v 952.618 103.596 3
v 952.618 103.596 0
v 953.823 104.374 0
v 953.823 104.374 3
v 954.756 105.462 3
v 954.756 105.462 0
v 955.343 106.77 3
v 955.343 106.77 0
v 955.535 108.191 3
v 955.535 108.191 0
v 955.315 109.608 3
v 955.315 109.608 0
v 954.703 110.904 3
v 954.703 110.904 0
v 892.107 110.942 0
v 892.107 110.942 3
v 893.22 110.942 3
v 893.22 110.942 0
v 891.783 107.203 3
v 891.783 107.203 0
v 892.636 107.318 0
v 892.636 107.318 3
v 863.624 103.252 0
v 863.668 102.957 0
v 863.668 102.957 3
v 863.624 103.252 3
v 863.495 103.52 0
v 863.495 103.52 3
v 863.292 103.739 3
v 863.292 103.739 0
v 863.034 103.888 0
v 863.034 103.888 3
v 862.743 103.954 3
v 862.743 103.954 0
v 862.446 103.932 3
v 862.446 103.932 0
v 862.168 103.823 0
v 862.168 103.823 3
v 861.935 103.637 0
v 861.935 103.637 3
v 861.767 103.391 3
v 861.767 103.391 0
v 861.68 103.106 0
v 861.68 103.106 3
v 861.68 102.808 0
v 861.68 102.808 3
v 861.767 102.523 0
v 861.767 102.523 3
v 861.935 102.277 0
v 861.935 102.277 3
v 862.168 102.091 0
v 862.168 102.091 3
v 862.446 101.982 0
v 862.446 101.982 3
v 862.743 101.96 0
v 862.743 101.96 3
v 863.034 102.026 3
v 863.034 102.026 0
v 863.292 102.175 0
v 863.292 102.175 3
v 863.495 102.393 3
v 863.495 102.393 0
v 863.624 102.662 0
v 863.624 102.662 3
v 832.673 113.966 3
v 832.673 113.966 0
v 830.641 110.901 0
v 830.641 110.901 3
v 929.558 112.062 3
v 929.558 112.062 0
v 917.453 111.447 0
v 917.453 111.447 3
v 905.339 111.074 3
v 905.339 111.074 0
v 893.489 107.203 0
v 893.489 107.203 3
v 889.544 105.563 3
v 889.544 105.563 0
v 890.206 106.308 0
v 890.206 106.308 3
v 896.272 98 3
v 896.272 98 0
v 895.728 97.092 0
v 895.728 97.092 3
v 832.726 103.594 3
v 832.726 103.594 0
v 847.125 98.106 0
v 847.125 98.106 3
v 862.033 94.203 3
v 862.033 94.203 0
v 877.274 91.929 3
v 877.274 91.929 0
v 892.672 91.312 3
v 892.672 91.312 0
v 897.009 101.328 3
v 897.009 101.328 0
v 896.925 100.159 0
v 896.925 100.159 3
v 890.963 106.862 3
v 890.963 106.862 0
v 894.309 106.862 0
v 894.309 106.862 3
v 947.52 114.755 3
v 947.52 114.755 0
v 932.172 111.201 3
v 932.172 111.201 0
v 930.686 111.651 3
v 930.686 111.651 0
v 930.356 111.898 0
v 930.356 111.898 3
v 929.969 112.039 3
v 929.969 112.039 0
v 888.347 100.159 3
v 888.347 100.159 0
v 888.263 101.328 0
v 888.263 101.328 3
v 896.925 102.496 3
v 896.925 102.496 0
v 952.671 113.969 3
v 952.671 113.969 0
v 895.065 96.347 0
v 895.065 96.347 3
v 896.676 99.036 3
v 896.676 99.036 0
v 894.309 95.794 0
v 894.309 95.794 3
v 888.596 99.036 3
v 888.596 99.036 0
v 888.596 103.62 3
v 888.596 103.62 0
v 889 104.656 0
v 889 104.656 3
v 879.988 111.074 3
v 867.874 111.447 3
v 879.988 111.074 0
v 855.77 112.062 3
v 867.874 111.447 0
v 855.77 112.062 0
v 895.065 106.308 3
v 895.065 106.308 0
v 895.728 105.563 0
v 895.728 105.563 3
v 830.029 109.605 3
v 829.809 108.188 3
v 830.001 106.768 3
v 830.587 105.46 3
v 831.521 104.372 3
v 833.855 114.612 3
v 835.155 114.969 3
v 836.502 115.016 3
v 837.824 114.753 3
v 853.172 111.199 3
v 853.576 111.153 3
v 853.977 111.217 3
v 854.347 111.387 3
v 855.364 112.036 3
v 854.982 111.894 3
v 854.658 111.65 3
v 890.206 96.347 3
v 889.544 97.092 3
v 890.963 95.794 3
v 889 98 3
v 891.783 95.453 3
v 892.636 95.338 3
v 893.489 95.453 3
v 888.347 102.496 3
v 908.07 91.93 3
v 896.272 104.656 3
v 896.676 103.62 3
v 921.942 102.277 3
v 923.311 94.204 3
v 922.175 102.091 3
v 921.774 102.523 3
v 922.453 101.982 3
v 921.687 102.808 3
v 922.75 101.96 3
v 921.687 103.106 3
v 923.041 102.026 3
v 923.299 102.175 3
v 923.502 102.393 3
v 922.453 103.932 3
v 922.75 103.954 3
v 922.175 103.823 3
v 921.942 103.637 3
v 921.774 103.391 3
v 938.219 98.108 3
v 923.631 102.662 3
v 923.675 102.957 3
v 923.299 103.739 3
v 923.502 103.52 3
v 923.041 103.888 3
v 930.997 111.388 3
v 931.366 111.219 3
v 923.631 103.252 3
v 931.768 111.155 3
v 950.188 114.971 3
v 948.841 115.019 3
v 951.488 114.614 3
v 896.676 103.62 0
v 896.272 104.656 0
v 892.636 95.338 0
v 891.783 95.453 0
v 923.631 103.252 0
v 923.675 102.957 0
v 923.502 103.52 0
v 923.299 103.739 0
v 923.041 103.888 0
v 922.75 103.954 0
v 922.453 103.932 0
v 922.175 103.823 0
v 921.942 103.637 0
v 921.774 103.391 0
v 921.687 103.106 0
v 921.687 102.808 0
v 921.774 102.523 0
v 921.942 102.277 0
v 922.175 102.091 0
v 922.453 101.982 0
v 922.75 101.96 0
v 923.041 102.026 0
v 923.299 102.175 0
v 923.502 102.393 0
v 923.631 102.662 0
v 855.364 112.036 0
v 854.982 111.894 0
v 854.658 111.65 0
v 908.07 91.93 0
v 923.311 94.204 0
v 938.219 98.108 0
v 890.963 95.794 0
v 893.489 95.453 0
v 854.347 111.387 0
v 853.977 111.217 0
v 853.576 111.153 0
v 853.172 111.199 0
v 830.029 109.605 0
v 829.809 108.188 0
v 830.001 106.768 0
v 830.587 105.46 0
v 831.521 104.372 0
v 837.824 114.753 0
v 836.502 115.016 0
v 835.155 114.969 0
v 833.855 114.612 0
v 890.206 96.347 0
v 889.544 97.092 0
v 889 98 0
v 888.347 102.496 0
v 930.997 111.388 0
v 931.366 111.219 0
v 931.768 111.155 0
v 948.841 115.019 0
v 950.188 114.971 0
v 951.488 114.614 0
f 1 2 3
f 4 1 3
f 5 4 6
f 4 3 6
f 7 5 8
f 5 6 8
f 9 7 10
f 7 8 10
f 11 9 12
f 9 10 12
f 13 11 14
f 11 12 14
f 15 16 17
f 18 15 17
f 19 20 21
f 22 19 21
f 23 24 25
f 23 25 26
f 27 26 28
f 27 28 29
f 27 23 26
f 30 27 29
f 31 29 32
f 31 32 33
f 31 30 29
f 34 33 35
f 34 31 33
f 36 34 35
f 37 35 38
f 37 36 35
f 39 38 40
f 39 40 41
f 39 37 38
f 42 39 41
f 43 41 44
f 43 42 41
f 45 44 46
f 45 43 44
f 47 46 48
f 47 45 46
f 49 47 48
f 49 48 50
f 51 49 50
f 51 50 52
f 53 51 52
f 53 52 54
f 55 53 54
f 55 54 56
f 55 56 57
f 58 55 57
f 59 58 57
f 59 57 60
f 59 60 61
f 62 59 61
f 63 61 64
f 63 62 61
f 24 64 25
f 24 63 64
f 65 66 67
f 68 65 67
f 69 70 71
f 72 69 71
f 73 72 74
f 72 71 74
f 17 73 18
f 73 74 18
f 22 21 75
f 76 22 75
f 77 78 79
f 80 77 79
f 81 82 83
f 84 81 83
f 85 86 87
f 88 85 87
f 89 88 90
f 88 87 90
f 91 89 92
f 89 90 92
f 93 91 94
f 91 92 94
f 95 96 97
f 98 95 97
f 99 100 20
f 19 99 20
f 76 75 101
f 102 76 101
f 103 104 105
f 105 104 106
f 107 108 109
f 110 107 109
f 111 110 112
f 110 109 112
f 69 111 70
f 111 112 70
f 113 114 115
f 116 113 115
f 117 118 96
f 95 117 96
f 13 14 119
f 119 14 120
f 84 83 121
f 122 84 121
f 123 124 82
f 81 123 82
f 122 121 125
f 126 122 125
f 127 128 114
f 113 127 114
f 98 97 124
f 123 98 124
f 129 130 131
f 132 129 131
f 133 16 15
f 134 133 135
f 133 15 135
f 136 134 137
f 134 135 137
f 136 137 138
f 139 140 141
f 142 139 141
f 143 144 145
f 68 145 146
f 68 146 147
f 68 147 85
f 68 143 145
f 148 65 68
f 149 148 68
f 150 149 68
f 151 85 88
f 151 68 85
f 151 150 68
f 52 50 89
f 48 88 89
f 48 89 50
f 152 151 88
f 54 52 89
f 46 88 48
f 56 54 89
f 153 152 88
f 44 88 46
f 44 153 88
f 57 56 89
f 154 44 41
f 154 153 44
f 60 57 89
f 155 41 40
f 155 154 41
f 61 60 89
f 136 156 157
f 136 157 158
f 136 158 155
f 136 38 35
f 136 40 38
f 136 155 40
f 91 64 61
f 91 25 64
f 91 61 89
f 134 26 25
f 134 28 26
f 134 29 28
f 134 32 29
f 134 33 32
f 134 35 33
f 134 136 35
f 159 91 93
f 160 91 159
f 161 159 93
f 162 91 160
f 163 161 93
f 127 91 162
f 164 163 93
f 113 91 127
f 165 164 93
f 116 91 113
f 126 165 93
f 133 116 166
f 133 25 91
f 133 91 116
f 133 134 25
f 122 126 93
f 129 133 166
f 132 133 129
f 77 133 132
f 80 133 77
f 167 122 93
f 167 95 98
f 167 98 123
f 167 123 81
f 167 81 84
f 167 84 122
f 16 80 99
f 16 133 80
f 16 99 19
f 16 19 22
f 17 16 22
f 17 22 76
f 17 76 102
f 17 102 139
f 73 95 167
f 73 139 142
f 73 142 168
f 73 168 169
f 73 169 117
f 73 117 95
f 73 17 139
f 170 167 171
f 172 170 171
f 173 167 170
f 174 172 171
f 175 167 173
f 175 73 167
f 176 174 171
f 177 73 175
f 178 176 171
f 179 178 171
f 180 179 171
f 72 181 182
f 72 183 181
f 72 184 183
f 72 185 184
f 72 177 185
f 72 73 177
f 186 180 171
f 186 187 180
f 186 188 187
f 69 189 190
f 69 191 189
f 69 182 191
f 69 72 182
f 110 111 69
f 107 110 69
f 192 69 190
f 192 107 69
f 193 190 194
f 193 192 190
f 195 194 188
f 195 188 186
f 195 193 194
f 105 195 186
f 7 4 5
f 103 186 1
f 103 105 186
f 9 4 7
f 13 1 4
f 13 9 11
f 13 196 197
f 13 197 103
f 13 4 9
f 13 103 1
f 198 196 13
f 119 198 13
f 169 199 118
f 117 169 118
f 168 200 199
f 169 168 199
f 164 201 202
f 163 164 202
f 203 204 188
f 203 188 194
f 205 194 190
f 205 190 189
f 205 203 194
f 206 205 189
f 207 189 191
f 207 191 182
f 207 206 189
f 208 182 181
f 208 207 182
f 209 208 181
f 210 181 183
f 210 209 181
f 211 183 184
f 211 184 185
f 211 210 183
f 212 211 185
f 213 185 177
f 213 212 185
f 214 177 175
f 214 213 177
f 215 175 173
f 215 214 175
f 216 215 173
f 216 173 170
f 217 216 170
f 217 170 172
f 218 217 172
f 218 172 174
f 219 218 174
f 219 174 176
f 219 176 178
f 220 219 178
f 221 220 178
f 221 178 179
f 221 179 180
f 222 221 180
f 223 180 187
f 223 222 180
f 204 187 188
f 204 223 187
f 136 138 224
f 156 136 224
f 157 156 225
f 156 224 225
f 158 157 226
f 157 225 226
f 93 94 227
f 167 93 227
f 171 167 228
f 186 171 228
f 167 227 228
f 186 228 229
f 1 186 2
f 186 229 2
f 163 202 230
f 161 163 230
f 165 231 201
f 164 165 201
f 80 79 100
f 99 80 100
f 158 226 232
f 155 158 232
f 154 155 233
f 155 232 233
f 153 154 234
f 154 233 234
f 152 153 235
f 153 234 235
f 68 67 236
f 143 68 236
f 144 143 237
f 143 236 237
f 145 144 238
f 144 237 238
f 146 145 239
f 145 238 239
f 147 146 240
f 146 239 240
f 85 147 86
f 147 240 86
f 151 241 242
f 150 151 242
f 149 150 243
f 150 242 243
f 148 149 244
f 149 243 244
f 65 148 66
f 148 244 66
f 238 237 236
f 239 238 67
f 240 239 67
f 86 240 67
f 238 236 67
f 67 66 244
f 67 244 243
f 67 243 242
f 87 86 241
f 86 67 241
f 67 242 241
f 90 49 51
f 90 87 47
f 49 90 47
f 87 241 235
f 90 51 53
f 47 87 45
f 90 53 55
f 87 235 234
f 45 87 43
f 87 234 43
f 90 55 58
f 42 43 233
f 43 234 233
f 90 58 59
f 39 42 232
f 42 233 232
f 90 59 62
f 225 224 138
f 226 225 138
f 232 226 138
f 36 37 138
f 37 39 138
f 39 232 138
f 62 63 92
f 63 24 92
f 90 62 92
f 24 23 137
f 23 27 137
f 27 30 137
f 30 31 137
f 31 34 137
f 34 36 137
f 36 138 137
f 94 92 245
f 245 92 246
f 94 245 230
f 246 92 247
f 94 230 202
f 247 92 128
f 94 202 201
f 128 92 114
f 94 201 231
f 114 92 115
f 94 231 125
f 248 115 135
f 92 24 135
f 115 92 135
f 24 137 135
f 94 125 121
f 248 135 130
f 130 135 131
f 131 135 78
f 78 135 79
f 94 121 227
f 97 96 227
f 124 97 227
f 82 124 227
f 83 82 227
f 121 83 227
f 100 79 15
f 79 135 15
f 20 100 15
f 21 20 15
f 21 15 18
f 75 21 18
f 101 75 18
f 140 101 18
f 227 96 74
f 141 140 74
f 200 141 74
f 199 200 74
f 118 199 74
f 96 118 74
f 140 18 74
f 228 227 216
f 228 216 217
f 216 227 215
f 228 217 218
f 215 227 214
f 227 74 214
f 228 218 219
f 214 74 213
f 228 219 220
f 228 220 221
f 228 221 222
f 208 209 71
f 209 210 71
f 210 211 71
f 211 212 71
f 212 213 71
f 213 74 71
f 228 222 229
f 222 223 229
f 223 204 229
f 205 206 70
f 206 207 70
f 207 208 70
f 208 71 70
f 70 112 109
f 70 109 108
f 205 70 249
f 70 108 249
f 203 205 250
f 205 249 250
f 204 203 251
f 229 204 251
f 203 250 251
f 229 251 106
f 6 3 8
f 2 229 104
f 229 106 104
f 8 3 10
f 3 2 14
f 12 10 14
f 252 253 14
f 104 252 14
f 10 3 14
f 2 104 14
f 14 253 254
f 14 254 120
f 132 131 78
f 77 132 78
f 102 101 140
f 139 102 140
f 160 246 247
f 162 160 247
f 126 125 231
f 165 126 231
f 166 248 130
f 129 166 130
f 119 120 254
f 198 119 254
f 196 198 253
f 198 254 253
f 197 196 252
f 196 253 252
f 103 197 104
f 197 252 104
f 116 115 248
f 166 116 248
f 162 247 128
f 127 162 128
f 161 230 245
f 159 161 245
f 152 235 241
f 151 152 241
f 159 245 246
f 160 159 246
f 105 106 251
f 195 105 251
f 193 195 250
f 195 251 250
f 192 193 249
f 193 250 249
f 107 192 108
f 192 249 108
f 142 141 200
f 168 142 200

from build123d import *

# Parameters (mm, degrees)
STOCK_ACRYLIC_PARTS_1_OUTLINE_R = 1
STOCK_ACRYLIC_PARTS_1_DEPTH     = 3
SKETCH2_W                       = 1.1125911
SKETCH2_H                       = 0.19748244
CUT_EXTRUDE1_DEPTH              = 963.439452829


# Read off the part's stored shape, not the designer's step: Stock-acrylic parts-1
with BuildPart() as part:
    # Stock-acrylic parts-1 outline → Stock-acrylic parts-1 (new body)
    with BuildSketch(Plane.XY):
        with BuildLine():
            Line((832.672571413, 113.966353753), (830.641097077, 110.901419151))
            ThreePointArc((830.641097077, 110.901419151), (830.000519222, 106.767582069), (832.725500034, 103.593715565))
            ThreePointArc((832.725500034, 103.593715565), (862.032980753, 94.202742704), (892.672186774, 91.311747764))
            ThreePointArc((892.672186774, 91.311747764), (923.311281331, 94.203923771), (952.618400028, 103.596026361))
            ThreePointArc((952.618400028, 103.596026361), (955.343258494, 106.769997904), (954.702521289, 110.90381029))
            Line((954.702521289, 110.90381029), (952.670928809, 113.968666581))
            ThreePointArc((952.670928809, 113.968666581), (950.188269571, 114.970742443), (947.519688189, 114.755274729))
            Line((947.519688189, 114.755274729), (932.172066536, 111.200676976))
            ThreePointArc((932.172066536, 111.200676976), (931.366268377, 111.218620275), (930.686084525, 111.65103508))
            ThreePointArc((930.686084525, 111.65103508), (930.167968592, 111.983103753), (929.557642996, 112.061947844))
            ThreePointArc((929.557642996, 112.061947844), (892.663576086, 110.941819466), (855.769509176, 112.061947844))
            ThreePointArc((855.769509176, 112.061947844), (855.167872493, 111.978815429), (854.65750502, 111.649569718))
            ThreePointArc((854.65750502, 111.649569718), (853.977337838, 111.217128694), (853.171540371, 111.199154333))
            Line((853.171540371, 111.199154333), (837.823781708, 114.753160468))
            ThreePointArc((837.823781708, 114.753160468), (835.155192022, 114.968525315), (832.672571413, 113.966353753))
        make_face()
        with Locations((862.668334441, 102.956811364)):
            Circle(STOCK_ACRYLIC_PARTS_1_OUTLINE_R, mode=Mode.SUBTRACT)
        Polygon((891.782840588, 107.202653527), (892.63595645, 107.317748247), (893.489072311, 107.202653527), (894.309403409, 106.861792394), (895.065424878, 106.308263949), (895.728083238, 105.56333998), (896.2719129, 104.655647498), (896.676014794, 103.620068616), (896.924859512, 102.496400048), (897.00888409, 101.327823749), (896.924859512, 100.15924745), (896.676014794, 99.035578883), (896.2719129, 98), (895.728083238, 97.092307518), (895.065424878, 96.347383549), (894.309403409, 95.793855104), (893.489072311, 95.452993971), (892.63595645, 95.337899251), (891.782840588, 95.452993971), (890.962509491, 95.793855104), (890.206488022, 96.347383549), (889.543829662, 97.092307518), (889, 98), (888.595898106, 99.035578883), (888.347053388, 100.15924745), (888.263028809, 101.327823749), (888.347053388, 102.496400048), (888.595898106, 103.620068616), (889, 104.655647498), (889.543829662, 105.56333998), (890.206488022, 106.308263949), (890.962509491, 106.861792394), align=None, mode=Mode.SUBTRACT)
        with Locations((922.675390412, 102.956811364)):
            Circle(STOCK_ACRYLIC_PARTS_1_OUTLINE_R, mode=Mode.SUBTRACT)
    extrude(amount=STOCK_ACRYLIC_PARTS_1_DEPTH)

    # Sketch2 → Cut-Extrude1 (cut, through all)
    with BuildSketch(Plane.XY.offset(3)):
        with Locations((892.663576086, 111.040560686)):
            Rectangle(SKETCH2_W, SKETCH2_H)
    extrude(amount=-CUT_EXTRUDE1_DEPTH, mode=Mode.SUBTRACT)


solid = part.part
